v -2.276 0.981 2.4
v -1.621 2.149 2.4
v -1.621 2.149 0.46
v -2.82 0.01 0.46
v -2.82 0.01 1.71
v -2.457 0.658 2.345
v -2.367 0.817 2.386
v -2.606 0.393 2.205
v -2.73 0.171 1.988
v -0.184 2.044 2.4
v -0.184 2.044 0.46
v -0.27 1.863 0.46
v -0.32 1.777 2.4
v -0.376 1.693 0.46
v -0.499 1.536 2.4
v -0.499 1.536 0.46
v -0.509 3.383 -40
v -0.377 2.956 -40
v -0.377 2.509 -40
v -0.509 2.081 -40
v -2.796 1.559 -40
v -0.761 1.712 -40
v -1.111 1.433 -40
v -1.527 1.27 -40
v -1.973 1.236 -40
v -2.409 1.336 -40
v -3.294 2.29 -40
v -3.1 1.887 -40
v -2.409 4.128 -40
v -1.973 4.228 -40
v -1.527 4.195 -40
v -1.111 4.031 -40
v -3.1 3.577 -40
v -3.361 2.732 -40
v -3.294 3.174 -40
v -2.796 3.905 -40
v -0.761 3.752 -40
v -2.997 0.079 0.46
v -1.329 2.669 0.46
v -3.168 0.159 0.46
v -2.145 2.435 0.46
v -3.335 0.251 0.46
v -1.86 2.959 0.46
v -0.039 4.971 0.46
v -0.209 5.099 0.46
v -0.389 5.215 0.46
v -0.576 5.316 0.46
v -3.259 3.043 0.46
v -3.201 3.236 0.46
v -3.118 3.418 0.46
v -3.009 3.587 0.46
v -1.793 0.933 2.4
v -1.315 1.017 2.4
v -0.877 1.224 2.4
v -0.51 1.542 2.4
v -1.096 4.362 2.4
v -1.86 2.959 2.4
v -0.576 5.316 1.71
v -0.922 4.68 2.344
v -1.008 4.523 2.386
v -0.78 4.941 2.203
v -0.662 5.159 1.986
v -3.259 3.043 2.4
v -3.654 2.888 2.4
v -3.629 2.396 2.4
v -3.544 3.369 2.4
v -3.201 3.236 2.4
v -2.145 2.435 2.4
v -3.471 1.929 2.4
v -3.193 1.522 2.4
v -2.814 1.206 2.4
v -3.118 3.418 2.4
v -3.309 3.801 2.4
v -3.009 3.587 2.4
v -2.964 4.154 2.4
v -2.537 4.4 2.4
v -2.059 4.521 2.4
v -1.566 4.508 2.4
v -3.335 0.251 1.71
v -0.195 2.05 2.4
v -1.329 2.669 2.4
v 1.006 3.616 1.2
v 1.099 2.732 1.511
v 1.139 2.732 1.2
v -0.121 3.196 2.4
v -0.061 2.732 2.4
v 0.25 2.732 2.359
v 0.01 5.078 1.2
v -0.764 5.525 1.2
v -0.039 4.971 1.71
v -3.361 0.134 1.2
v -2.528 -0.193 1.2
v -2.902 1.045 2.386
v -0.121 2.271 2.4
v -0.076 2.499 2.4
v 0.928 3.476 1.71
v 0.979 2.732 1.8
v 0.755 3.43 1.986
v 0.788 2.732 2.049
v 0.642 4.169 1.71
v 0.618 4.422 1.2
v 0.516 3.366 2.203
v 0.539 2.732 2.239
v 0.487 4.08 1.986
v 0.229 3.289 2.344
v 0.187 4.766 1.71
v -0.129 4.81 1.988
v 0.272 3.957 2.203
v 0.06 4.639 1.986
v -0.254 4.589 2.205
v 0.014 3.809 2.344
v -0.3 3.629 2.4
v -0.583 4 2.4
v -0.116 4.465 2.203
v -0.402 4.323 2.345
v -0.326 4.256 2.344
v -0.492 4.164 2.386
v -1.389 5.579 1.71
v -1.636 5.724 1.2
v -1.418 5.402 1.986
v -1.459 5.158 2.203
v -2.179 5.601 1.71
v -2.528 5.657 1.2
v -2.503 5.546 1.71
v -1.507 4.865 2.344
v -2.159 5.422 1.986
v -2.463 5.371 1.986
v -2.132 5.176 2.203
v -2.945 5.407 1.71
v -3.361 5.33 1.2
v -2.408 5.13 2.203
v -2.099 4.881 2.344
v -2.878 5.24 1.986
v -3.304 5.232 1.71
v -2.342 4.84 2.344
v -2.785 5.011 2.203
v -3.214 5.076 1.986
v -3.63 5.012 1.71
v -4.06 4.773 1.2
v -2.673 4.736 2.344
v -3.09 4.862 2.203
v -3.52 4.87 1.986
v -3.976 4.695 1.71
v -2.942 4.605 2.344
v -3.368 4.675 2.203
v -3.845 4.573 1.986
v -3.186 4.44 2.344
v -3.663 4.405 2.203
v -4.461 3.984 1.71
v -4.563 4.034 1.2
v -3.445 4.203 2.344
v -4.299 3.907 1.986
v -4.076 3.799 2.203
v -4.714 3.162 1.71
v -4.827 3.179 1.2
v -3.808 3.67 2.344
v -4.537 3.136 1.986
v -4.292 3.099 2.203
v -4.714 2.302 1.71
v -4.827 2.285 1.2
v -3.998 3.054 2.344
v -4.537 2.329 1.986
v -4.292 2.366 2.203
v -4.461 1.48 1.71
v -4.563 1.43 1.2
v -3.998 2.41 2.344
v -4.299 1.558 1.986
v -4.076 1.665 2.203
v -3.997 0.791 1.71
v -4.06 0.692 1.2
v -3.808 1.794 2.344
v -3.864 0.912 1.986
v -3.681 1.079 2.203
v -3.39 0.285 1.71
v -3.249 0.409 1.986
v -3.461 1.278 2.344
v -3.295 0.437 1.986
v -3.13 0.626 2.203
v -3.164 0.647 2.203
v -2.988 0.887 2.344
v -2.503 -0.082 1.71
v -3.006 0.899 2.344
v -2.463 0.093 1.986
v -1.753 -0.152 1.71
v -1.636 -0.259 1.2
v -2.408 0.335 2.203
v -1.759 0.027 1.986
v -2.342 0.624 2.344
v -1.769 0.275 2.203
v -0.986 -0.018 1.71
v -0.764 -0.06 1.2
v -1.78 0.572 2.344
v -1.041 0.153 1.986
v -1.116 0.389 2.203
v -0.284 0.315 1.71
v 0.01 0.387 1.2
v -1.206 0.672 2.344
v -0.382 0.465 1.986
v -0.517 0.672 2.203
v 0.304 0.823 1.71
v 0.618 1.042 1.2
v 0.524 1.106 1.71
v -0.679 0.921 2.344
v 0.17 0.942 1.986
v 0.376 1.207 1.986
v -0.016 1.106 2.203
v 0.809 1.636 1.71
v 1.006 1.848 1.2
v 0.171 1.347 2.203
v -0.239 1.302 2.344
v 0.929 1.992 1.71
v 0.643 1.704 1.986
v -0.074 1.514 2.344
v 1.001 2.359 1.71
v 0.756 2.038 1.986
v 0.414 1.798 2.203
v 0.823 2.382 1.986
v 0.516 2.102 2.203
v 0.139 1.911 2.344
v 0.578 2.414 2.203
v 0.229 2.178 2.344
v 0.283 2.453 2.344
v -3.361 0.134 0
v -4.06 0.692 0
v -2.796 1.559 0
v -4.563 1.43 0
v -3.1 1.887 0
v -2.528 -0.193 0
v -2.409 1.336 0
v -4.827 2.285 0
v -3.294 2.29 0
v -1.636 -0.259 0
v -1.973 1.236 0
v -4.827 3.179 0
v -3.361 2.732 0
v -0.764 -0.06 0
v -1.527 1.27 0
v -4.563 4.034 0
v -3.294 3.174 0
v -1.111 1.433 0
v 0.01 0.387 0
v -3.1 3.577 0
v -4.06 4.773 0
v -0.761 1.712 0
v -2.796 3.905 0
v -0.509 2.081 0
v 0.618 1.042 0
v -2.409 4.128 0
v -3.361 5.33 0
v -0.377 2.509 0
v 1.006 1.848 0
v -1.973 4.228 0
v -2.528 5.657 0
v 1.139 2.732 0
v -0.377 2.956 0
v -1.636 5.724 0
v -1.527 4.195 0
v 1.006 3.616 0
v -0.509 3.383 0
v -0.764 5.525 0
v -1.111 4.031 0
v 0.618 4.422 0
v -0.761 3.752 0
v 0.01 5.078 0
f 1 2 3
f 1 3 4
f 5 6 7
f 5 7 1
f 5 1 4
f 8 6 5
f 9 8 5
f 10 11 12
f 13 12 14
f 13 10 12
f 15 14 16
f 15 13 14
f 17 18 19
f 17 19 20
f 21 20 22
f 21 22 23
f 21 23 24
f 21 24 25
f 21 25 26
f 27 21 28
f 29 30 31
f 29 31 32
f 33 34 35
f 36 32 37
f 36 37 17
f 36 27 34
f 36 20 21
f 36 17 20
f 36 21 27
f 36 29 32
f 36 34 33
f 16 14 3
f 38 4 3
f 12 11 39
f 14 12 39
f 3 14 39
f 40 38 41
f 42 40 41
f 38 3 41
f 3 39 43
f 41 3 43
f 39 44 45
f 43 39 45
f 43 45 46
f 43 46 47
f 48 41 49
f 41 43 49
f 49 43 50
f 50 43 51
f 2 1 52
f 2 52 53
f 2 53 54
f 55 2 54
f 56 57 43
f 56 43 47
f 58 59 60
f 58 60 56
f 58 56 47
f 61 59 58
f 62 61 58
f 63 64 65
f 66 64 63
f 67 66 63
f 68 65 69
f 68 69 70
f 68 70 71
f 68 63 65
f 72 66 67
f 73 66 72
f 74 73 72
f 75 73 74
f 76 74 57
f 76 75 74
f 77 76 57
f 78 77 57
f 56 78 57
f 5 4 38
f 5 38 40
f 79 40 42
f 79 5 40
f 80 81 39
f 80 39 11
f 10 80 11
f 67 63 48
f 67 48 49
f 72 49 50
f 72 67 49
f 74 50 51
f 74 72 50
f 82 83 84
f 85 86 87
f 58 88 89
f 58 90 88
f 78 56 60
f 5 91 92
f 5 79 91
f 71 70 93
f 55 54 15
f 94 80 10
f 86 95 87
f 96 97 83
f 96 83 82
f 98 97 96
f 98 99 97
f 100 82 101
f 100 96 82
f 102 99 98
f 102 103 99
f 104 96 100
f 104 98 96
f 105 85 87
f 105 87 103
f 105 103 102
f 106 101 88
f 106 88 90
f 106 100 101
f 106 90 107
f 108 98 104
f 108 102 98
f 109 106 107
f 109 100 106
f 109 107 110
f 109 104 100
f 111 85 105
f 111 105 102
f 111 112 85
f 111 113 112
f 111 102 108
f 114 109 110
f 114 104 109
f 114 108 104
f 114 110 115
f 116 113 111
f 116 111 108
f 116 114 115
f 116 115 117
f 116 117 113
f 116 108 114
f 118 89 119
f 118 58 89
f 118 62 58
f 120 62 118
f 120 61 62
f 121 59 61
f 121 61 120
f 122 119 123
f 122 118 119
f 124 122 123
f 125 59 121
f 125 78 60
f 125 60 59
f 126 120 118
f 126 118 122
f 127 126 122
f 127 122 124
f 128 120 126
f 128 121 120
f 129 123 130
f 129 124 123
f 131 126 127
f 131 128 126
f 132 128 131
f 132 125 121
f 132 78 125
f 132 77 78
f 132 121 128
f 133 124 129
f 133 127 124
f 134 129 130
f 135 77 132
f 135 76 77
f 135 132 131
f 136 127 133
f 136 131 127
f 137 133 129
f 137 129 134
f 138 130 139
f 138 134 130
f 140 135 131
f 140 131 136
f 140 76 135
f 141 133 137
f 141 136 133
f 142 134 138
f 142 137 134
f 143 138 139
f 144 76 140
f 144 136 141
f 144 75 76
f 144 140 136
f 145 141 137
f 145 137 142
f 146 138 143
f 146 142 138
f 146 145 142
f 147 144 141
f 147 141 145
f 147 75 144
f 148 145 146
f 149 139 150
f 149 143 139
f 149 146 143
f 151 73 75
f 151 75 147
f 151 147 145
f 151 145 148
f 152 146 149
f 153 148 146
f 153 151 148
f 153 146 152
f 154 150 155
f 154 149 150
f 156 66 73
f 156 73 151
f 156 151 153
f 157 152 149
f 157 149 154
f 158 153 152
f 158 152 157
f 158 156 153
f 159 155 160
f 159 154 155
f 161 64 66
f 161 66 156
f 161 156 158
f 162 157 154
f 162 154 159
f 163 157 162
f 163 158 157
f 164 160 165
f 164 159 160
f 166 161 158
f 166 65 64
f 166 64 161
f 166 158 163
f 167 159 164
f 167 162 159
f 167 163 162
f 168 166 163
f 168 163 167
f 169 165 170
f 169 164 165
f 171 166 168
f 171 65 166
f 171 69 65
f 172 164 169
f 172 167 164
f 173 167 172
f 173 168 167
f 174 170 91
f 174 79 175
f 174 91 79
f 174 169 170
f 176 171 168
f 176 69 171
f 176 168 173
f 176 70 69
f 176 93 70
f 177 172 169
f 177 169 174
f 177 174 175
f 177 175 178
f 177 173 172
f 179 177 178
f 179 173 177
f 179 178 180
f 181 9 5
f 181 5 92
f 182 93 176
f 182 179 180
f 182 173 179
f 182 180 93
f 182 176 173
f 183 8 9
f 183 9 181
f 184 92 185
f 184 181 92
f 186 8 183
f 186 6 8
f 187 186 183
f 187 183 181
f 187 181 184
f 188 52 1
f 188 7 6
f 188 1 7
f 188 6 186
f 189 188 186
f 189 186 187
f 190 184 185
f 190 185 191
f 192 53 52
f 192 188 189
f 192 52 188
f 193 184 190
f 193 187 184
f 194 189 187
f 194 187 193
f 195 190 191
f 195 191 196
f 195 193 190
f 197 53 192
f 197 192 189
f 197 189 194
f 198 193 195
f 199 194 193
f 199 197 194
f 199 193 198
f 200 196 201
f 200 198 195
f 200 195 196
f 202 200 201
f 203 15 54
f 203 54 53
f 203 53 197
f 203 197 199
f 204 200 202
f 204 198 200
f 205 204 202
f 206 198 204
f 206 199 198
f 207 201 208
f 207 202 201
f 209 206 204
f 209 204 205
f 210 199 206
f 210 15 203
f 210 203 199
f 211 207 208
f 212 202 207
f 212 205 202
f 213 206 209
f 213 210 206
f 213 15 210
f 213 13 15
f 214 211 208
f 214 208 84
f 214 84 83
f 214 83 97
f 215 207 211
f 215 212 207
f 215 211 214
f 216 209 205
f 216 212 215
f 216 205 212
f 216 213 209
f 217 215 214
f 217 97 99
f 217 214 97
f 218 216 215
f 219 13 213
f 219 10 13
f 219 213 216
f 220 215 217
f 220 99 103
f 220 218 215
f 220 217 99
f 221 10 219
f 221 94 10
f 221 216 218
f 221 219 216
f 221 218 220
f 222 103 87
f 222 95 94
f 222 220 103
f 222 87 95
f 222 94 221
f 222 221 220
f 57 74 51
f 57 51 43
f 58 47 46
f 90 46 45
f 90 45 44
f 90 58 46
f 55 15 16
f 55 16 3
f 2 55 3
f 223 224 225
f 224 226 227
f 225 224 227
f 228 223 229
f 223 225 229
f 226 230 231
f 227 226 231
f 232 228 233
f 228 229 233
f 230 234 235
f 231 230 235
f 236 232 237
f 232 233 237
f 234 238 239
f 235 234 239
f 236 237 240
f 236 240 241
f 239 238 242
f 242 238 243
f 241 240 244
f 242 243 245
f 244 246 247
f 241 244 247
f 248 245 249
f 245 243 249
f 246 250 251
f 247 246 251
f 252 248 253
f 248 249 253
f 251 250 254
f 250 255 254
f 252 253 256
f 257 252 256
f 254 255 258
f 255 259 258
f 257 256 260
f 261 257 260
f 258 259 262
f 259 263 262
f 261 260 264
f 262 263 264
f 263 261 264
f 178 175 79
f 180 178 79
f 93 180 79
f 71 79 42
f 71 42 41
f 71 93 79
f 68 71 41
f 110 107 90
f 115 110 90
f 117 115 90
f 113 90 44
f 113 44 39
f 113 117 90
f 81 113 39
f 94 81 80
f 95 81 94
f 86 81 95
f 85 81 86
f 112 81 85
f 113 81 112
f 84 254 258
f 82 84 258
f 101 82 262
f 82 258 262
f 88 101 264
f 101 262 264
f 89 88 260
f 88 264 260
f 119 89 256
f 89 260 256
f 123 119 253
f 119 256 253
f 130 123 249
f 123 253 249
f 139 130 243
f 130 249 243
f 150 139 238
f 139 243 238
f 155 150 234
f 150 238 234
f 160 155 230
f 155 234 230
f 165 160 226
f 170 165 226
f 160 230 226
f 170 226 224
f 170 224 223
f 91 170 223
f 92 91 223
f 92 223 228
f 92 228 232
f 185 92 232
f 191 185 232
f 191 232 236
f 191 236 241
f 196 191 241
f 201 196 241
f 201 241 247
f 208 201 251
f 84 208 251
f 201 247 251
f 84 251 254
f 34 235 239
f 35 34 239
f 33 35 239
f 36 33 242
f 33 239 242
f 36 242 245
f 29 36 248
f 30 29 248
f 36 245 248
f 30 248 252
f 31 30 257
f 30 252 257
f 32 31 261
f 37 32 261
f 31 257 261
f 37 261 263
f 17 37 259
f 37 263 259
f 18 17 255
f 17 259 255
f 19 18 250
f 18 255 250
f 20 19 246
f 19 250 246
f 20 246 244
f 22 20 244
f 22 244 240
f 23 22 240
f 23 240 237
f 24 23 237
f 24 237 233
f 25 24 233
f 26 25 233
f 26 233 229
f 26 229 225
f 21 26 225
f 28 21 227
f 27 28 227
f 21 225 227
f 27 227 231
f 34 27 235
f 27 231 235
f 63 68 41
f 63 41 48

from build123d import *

# Parameters (mm, degrees)
SZKIC1_R                    = 3
DODANIE_WYCI_GNI_CIE2_DEPTH = 2.4
SZKIC2_R                    = 1.5
DODANIE_WYCI_GNI_CIE3_DEPTH = 40
ZAOKR_GLENIE2_R             = 1.2
WYTNIJ_WYCI_GNI_CIE1_DEPTH  = 1.94


with BuildPart() as part:
    # Szkic1 → Dodanie-wyciągnięcie2 (new body)
    with BuildSketch(Plane.XY):
        with Locations((-1.860516246, 2.732142857)):
            Circle(SZKIC1_R)
    extrude(amount=DODANIE_WYCI_GNI_CIE2_DEPTH)

    # Szkic2 → Dodanie-wyciągnięcie3 (add)
    with BuildSketch(Plane(origin=(0, 0, 0), x_dir=(-1, 0, 0), z_dir=(0, 0, -1))):
        with Locations((1.860516246, 2.732142857)):
            Circle(SZKIC2_R)
    extrude(amount=DODANIE_WYCI_GNI_CIE3_DEPTH)

    # Zaokrąglenie2
    zaokr_glenie2_edges = [part.edges().sort_by_distance(p)[0] for p in [
        (-4.860516246, 2.732142857, 2.4),
    ]]
    fillet(zaokr_glenie2_edges, radius=ZAOKR_GLENIE2_R)

    # Szkic3 → Wytnij-wyciągnięcie1 (cut)
    with BuildSketch(Plane.XY.offset(2.4)):
        with BuildLine():
            Line((-1.859548318, 2.959091853), (-0.575649693, 5.316481314))
            ThreePointArc((-0.575649693, 5.316481314), (-0.297886623, 5.158637444), (-0.039271083, 4.97106076))
            Line((-0.039271083, 4.97106076), (-1.329373025, 2.669425378))
            Line((-1.329373025, 2.669425378), (-0.183967515, 2.043621837))
            ThreePointArc((-0.183967515, 2.043621837), (-0.320475658, 1.776553075), (-0.499159616, 1.535654258))
            Line((-0.499159616, 1.535654258), (-1.621312108, 2.148584891))
            Line((-1.621312108, 2.148584891), (-2.819933608, 0.01015725))
            ThreePointArc((-2.819933608, 0.01015725), (-3.083174674, 0.117799023), (-3.33454353, 0.250826496))
            Line((-3.33454353, 0.250826496), (-2.145142944, 2.434706401))
            Line((-2.145142944, 2.434706401), (-3.258687897, 3.042935511))
            ThreePointArc((-3.258687897, 3.042935511), (-3.162842423, 3.328316127), (-3.009463836, 3.587359481))
            Line((-3.009463836, 3.587359481), (-1.859548318, 2.959091853))
        make_face()
    extrude(amount=-WYTNIJ_WYCI_GNI_CIE1_DEPTH, mode=Mode.SUBTRACT)


solid = part.part
